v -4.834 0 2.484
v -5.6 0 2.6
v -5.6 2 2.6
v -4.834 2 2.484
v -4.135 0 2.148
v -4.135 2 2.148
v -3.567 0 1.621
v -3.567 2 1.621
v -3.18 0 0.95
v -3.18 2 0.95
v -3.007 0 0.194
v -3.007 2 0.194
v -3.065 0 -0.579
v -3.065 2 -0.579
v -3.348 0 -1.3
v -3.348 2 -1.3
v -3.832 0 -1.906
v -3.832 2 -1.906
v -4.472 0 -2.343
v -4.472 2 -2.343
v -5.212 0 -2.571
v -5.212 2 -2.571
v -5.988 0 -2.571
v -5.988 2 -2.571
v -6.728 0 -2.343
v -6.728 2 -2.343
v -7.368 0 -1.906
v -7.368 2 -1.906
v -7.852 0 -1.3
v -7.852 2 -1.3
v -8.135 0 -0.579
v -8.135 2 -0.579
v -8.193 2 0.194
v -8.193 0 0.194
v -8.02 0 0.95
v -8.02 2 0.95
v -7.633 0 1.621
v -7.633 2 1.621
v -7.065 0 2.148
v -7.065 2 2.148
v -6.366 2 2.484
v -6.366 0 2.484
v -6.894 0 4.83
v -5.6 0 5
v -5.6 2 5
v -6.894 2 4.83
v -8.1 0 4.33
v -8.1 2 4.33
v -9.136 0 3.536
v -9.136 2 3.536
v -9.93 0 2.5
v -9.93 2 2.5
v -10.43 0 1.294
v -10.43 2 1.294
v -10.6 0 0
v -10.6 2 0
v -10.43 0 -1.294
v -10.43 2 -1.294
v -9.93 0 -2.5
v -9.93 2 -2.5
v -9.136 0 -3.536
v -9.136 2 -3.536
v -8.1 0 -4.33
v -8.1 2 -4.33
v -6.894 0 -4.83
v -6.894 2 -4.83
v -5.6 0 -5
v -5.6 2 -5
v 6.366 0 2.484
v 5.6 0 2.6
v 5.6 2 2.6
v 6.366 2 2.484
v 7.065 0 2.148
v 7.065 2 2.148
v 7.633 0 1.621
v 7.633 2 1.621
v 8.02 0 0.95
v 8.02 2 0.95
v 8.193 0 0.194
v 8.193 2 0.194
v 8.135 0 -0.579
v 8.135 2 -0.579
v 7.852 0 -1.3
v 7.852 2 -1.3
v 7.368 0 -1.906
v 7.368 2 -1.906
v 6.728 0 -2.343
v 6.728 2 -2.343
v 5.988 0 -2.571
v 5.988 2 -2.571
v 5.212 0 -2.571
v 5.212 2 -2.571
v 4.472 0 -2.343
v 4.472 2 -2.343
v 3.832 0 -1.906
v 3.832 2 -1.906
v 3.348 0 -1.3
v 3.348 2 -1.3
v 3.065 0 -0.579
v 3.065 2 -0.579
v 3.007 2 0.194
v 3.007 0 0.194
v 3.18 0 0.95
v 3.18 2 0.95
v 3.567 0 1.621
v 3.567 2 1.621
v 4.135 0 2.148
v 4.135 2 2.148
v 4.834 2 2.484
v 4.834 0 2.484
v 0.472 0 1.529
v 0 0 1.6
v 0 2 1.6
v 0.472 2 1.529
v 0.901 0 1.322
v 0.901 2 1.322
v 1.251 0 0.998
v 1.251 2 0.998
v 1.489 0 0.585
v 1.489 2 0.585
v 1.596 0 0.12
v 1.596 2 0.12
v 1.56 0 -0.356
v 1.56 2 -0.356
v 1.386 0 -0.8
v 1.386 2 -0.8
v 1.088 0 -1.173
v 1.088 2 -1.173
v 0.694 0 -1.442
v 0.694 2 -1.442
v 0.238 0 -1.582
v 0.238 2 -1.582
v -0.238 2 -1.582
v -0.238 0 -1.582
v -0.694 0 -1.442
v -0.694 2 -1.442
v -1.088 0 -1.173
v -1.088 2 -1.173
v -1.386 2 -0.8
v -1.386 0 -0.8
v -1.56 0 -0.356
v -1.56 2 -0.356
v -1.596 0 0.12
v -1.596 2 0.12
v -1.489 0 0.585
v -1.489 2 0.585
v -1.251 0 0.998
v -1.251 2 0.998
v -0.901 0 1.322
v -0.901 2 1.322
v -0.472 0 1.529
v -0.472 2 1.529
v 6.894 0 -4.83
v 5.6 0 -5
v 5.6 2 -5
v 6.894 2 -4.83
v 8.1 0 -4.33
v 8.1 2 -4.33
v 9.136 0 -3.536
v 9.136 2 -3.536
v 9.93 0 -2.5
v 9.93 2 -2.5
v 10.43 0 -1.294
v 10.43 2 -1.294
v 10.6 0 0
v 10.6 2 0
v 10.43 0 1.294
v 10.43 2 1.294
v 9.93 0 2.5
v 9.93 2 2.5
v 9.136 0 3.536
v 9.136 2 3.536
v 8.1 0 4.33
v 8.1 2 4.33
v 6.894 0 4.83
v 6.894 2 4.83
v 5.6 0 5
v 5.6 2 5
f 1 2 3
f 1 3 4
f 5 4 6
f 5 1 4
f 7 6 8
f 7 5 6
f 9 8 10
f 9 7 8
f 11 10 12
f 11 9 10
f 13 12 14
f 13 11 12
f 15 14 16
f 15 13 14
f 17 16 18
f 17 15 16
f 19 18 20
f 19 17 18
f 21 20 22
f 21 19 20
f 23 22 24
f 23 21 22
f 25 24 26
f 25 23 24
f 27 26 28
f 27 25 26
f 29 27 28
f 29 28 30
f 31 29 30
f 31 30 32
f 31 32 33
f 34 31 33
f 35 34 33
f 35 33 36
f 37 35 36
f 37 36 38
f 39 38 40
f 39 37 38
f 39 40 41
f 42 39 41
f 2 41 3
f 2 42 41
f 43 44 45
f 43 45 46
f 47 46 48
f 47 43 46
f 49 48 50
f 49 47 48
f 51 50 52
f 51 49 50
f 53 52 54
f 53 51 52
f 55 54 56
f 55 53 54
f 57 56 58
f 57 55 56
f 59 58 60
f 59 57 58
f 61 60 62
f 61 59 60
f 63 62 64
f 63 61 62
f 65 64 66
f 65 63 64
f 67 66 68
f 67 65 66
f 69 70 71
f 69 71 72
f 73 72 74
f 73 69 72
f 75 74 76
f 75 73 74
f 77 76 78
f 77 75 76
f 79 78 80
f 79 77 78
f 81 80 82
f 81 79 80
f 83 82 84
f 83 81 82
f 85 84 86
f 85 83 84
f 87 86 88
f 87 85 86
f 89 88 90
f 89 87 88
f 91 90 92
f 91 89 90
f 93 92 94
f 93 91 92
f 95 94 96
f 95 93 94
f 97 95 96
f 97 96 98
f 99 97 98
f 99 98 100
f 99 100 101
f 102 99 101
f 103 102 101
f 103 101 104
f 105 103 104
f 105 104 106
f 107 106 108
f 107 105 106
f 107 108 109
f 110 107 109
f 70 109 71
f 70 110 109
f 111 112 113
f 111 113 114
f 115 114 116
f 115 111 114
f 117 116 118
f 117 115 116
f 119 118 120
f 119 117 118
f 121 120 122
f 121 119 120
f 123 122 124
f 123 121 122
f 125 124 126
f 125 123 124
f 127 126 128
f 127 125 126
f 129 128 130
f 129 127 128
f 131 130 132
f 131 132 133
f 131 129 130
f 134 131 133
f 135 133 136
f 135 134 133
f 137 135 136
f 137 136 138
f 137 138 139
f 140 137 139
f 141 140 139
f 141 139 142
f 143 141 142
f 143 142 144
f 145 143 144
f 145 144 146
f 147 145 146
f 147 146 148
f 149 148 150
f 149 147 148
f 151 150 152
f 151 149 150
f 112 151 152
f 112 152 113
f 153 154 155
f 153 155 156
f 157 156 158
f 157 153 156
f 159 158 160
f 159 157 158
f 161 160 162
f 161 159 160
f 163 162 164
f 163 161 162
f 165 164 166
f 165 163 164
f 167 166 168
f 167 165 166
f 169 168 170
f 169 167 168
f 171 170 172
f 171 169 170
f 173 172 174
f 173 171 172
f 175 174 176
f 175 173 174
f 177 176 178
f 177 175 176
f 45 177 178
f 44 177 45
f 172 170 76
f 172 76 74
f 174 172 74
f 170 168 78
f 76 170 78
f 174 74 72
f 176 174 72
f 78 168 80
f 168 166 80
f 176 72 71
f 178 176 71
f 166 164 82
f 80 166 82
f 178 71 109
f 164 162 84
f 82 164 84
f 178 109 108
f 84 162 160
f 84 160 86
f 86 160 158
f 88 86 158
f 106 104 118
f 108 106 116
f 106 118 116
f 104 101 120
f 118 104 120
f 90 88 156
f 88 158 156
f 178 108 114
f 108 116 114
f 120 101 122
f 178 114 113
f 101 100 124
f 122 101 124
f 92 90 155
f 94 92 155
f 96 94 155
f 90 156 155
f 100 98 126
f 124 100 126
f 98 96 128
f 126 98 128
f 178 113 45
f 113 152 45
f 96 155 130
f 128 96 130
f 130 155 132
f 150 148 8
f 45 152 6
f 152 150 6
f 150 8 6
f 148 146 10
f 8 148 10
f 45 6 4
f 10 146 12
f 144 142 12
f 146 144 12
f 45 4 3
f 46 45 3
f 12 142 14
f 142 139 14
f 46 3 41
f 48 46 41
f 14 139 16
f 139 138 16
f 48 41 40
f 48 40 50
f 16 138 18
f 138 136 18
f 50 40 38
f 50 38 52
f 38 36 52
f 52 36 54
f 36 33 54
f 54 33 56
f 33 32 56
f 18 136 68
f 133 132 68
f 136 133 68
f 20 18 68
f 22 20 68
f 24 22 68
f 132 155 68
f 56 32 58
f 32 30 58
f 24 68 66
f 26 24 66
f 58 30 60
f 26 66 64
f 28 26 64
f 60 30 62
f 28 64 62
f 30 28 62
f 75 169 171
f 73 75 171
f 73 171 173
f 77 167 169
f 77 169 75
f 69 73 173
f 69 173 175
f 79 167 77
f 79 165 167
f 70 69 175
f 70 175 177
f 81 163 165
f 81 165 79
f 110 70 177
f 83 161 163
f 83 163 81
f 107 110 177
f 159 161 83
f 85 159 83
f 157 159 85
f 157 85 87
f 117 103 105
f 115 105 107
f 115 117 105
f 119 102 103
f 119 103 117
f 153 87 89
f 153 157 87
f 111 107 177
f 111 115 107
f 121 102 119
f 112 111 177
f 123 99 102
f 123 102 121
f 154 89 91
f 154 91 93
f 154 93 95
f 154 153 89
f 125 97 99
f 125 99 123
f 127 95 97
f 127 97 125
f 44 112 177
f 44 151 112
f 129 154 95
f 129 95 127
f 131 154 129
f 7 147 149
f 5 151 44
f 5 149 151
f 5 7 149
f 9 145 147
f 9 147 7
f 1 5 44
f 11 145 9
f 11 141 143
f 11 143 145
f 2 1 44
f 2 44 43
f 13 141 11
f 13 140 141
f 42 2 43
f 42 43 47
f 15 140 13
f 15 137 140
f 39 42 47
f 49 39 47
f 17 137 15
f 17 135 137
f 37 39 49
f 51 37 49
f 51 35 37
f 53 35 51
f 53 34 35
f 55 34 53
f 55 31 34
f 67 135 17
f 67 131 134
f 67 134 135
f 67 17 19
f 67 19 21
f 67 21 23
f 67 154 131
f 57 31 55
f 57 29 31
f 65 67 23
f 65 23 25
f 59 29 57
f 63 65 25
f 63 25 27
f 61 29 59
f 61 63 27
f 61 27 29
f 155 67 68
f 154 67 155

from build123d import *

# Parameters (mm, degrees)
SKETCH_1_R      = 2.6
SKETCH_1_R_2    = 1.6
EXTRUDE_1_DEPTH = 2


with BuildPart() as part:
    # ｽｹｯﾁ1 → ﾎﾞｽ - 押し出し1 (new body)
    with BuildSketch(Plane(origin=(0, 0, 0), x_dir=(1, 0, 0), z_dir=(0, 1, 0))):
        with BuildLine():
            Line((-5.6, 5), (5.6, 5))
            ThreePointArc((5.6, 5), (10.6, 0), (5.6, -5))
            Line((5.6, -5), (-5.6, -5))
            ThreePointArc((-5.6, -5), (-10.6, 0), (-5.6, 5))
        make_face()
        with Locations(Location((-5.6, 0, 0), (0, 0, 270))):
            Circle(SKETCH_1_R, mode=Mode.SUBTRACT)
        with Locations(Location((5.6, 0, 0), (0, 0, 270))):
            Circle(SKETCH_1_R, mode=Mode.SUBTRACT)
        with Locations(Location((0, 0, 0), (0, 0, 270))):
            Circle(SKETCH_1_R_2, mode=Mode.SUBTRACT)
    extrude(amount=EXTRUDE_1_DEPTH)


solid = part.part
